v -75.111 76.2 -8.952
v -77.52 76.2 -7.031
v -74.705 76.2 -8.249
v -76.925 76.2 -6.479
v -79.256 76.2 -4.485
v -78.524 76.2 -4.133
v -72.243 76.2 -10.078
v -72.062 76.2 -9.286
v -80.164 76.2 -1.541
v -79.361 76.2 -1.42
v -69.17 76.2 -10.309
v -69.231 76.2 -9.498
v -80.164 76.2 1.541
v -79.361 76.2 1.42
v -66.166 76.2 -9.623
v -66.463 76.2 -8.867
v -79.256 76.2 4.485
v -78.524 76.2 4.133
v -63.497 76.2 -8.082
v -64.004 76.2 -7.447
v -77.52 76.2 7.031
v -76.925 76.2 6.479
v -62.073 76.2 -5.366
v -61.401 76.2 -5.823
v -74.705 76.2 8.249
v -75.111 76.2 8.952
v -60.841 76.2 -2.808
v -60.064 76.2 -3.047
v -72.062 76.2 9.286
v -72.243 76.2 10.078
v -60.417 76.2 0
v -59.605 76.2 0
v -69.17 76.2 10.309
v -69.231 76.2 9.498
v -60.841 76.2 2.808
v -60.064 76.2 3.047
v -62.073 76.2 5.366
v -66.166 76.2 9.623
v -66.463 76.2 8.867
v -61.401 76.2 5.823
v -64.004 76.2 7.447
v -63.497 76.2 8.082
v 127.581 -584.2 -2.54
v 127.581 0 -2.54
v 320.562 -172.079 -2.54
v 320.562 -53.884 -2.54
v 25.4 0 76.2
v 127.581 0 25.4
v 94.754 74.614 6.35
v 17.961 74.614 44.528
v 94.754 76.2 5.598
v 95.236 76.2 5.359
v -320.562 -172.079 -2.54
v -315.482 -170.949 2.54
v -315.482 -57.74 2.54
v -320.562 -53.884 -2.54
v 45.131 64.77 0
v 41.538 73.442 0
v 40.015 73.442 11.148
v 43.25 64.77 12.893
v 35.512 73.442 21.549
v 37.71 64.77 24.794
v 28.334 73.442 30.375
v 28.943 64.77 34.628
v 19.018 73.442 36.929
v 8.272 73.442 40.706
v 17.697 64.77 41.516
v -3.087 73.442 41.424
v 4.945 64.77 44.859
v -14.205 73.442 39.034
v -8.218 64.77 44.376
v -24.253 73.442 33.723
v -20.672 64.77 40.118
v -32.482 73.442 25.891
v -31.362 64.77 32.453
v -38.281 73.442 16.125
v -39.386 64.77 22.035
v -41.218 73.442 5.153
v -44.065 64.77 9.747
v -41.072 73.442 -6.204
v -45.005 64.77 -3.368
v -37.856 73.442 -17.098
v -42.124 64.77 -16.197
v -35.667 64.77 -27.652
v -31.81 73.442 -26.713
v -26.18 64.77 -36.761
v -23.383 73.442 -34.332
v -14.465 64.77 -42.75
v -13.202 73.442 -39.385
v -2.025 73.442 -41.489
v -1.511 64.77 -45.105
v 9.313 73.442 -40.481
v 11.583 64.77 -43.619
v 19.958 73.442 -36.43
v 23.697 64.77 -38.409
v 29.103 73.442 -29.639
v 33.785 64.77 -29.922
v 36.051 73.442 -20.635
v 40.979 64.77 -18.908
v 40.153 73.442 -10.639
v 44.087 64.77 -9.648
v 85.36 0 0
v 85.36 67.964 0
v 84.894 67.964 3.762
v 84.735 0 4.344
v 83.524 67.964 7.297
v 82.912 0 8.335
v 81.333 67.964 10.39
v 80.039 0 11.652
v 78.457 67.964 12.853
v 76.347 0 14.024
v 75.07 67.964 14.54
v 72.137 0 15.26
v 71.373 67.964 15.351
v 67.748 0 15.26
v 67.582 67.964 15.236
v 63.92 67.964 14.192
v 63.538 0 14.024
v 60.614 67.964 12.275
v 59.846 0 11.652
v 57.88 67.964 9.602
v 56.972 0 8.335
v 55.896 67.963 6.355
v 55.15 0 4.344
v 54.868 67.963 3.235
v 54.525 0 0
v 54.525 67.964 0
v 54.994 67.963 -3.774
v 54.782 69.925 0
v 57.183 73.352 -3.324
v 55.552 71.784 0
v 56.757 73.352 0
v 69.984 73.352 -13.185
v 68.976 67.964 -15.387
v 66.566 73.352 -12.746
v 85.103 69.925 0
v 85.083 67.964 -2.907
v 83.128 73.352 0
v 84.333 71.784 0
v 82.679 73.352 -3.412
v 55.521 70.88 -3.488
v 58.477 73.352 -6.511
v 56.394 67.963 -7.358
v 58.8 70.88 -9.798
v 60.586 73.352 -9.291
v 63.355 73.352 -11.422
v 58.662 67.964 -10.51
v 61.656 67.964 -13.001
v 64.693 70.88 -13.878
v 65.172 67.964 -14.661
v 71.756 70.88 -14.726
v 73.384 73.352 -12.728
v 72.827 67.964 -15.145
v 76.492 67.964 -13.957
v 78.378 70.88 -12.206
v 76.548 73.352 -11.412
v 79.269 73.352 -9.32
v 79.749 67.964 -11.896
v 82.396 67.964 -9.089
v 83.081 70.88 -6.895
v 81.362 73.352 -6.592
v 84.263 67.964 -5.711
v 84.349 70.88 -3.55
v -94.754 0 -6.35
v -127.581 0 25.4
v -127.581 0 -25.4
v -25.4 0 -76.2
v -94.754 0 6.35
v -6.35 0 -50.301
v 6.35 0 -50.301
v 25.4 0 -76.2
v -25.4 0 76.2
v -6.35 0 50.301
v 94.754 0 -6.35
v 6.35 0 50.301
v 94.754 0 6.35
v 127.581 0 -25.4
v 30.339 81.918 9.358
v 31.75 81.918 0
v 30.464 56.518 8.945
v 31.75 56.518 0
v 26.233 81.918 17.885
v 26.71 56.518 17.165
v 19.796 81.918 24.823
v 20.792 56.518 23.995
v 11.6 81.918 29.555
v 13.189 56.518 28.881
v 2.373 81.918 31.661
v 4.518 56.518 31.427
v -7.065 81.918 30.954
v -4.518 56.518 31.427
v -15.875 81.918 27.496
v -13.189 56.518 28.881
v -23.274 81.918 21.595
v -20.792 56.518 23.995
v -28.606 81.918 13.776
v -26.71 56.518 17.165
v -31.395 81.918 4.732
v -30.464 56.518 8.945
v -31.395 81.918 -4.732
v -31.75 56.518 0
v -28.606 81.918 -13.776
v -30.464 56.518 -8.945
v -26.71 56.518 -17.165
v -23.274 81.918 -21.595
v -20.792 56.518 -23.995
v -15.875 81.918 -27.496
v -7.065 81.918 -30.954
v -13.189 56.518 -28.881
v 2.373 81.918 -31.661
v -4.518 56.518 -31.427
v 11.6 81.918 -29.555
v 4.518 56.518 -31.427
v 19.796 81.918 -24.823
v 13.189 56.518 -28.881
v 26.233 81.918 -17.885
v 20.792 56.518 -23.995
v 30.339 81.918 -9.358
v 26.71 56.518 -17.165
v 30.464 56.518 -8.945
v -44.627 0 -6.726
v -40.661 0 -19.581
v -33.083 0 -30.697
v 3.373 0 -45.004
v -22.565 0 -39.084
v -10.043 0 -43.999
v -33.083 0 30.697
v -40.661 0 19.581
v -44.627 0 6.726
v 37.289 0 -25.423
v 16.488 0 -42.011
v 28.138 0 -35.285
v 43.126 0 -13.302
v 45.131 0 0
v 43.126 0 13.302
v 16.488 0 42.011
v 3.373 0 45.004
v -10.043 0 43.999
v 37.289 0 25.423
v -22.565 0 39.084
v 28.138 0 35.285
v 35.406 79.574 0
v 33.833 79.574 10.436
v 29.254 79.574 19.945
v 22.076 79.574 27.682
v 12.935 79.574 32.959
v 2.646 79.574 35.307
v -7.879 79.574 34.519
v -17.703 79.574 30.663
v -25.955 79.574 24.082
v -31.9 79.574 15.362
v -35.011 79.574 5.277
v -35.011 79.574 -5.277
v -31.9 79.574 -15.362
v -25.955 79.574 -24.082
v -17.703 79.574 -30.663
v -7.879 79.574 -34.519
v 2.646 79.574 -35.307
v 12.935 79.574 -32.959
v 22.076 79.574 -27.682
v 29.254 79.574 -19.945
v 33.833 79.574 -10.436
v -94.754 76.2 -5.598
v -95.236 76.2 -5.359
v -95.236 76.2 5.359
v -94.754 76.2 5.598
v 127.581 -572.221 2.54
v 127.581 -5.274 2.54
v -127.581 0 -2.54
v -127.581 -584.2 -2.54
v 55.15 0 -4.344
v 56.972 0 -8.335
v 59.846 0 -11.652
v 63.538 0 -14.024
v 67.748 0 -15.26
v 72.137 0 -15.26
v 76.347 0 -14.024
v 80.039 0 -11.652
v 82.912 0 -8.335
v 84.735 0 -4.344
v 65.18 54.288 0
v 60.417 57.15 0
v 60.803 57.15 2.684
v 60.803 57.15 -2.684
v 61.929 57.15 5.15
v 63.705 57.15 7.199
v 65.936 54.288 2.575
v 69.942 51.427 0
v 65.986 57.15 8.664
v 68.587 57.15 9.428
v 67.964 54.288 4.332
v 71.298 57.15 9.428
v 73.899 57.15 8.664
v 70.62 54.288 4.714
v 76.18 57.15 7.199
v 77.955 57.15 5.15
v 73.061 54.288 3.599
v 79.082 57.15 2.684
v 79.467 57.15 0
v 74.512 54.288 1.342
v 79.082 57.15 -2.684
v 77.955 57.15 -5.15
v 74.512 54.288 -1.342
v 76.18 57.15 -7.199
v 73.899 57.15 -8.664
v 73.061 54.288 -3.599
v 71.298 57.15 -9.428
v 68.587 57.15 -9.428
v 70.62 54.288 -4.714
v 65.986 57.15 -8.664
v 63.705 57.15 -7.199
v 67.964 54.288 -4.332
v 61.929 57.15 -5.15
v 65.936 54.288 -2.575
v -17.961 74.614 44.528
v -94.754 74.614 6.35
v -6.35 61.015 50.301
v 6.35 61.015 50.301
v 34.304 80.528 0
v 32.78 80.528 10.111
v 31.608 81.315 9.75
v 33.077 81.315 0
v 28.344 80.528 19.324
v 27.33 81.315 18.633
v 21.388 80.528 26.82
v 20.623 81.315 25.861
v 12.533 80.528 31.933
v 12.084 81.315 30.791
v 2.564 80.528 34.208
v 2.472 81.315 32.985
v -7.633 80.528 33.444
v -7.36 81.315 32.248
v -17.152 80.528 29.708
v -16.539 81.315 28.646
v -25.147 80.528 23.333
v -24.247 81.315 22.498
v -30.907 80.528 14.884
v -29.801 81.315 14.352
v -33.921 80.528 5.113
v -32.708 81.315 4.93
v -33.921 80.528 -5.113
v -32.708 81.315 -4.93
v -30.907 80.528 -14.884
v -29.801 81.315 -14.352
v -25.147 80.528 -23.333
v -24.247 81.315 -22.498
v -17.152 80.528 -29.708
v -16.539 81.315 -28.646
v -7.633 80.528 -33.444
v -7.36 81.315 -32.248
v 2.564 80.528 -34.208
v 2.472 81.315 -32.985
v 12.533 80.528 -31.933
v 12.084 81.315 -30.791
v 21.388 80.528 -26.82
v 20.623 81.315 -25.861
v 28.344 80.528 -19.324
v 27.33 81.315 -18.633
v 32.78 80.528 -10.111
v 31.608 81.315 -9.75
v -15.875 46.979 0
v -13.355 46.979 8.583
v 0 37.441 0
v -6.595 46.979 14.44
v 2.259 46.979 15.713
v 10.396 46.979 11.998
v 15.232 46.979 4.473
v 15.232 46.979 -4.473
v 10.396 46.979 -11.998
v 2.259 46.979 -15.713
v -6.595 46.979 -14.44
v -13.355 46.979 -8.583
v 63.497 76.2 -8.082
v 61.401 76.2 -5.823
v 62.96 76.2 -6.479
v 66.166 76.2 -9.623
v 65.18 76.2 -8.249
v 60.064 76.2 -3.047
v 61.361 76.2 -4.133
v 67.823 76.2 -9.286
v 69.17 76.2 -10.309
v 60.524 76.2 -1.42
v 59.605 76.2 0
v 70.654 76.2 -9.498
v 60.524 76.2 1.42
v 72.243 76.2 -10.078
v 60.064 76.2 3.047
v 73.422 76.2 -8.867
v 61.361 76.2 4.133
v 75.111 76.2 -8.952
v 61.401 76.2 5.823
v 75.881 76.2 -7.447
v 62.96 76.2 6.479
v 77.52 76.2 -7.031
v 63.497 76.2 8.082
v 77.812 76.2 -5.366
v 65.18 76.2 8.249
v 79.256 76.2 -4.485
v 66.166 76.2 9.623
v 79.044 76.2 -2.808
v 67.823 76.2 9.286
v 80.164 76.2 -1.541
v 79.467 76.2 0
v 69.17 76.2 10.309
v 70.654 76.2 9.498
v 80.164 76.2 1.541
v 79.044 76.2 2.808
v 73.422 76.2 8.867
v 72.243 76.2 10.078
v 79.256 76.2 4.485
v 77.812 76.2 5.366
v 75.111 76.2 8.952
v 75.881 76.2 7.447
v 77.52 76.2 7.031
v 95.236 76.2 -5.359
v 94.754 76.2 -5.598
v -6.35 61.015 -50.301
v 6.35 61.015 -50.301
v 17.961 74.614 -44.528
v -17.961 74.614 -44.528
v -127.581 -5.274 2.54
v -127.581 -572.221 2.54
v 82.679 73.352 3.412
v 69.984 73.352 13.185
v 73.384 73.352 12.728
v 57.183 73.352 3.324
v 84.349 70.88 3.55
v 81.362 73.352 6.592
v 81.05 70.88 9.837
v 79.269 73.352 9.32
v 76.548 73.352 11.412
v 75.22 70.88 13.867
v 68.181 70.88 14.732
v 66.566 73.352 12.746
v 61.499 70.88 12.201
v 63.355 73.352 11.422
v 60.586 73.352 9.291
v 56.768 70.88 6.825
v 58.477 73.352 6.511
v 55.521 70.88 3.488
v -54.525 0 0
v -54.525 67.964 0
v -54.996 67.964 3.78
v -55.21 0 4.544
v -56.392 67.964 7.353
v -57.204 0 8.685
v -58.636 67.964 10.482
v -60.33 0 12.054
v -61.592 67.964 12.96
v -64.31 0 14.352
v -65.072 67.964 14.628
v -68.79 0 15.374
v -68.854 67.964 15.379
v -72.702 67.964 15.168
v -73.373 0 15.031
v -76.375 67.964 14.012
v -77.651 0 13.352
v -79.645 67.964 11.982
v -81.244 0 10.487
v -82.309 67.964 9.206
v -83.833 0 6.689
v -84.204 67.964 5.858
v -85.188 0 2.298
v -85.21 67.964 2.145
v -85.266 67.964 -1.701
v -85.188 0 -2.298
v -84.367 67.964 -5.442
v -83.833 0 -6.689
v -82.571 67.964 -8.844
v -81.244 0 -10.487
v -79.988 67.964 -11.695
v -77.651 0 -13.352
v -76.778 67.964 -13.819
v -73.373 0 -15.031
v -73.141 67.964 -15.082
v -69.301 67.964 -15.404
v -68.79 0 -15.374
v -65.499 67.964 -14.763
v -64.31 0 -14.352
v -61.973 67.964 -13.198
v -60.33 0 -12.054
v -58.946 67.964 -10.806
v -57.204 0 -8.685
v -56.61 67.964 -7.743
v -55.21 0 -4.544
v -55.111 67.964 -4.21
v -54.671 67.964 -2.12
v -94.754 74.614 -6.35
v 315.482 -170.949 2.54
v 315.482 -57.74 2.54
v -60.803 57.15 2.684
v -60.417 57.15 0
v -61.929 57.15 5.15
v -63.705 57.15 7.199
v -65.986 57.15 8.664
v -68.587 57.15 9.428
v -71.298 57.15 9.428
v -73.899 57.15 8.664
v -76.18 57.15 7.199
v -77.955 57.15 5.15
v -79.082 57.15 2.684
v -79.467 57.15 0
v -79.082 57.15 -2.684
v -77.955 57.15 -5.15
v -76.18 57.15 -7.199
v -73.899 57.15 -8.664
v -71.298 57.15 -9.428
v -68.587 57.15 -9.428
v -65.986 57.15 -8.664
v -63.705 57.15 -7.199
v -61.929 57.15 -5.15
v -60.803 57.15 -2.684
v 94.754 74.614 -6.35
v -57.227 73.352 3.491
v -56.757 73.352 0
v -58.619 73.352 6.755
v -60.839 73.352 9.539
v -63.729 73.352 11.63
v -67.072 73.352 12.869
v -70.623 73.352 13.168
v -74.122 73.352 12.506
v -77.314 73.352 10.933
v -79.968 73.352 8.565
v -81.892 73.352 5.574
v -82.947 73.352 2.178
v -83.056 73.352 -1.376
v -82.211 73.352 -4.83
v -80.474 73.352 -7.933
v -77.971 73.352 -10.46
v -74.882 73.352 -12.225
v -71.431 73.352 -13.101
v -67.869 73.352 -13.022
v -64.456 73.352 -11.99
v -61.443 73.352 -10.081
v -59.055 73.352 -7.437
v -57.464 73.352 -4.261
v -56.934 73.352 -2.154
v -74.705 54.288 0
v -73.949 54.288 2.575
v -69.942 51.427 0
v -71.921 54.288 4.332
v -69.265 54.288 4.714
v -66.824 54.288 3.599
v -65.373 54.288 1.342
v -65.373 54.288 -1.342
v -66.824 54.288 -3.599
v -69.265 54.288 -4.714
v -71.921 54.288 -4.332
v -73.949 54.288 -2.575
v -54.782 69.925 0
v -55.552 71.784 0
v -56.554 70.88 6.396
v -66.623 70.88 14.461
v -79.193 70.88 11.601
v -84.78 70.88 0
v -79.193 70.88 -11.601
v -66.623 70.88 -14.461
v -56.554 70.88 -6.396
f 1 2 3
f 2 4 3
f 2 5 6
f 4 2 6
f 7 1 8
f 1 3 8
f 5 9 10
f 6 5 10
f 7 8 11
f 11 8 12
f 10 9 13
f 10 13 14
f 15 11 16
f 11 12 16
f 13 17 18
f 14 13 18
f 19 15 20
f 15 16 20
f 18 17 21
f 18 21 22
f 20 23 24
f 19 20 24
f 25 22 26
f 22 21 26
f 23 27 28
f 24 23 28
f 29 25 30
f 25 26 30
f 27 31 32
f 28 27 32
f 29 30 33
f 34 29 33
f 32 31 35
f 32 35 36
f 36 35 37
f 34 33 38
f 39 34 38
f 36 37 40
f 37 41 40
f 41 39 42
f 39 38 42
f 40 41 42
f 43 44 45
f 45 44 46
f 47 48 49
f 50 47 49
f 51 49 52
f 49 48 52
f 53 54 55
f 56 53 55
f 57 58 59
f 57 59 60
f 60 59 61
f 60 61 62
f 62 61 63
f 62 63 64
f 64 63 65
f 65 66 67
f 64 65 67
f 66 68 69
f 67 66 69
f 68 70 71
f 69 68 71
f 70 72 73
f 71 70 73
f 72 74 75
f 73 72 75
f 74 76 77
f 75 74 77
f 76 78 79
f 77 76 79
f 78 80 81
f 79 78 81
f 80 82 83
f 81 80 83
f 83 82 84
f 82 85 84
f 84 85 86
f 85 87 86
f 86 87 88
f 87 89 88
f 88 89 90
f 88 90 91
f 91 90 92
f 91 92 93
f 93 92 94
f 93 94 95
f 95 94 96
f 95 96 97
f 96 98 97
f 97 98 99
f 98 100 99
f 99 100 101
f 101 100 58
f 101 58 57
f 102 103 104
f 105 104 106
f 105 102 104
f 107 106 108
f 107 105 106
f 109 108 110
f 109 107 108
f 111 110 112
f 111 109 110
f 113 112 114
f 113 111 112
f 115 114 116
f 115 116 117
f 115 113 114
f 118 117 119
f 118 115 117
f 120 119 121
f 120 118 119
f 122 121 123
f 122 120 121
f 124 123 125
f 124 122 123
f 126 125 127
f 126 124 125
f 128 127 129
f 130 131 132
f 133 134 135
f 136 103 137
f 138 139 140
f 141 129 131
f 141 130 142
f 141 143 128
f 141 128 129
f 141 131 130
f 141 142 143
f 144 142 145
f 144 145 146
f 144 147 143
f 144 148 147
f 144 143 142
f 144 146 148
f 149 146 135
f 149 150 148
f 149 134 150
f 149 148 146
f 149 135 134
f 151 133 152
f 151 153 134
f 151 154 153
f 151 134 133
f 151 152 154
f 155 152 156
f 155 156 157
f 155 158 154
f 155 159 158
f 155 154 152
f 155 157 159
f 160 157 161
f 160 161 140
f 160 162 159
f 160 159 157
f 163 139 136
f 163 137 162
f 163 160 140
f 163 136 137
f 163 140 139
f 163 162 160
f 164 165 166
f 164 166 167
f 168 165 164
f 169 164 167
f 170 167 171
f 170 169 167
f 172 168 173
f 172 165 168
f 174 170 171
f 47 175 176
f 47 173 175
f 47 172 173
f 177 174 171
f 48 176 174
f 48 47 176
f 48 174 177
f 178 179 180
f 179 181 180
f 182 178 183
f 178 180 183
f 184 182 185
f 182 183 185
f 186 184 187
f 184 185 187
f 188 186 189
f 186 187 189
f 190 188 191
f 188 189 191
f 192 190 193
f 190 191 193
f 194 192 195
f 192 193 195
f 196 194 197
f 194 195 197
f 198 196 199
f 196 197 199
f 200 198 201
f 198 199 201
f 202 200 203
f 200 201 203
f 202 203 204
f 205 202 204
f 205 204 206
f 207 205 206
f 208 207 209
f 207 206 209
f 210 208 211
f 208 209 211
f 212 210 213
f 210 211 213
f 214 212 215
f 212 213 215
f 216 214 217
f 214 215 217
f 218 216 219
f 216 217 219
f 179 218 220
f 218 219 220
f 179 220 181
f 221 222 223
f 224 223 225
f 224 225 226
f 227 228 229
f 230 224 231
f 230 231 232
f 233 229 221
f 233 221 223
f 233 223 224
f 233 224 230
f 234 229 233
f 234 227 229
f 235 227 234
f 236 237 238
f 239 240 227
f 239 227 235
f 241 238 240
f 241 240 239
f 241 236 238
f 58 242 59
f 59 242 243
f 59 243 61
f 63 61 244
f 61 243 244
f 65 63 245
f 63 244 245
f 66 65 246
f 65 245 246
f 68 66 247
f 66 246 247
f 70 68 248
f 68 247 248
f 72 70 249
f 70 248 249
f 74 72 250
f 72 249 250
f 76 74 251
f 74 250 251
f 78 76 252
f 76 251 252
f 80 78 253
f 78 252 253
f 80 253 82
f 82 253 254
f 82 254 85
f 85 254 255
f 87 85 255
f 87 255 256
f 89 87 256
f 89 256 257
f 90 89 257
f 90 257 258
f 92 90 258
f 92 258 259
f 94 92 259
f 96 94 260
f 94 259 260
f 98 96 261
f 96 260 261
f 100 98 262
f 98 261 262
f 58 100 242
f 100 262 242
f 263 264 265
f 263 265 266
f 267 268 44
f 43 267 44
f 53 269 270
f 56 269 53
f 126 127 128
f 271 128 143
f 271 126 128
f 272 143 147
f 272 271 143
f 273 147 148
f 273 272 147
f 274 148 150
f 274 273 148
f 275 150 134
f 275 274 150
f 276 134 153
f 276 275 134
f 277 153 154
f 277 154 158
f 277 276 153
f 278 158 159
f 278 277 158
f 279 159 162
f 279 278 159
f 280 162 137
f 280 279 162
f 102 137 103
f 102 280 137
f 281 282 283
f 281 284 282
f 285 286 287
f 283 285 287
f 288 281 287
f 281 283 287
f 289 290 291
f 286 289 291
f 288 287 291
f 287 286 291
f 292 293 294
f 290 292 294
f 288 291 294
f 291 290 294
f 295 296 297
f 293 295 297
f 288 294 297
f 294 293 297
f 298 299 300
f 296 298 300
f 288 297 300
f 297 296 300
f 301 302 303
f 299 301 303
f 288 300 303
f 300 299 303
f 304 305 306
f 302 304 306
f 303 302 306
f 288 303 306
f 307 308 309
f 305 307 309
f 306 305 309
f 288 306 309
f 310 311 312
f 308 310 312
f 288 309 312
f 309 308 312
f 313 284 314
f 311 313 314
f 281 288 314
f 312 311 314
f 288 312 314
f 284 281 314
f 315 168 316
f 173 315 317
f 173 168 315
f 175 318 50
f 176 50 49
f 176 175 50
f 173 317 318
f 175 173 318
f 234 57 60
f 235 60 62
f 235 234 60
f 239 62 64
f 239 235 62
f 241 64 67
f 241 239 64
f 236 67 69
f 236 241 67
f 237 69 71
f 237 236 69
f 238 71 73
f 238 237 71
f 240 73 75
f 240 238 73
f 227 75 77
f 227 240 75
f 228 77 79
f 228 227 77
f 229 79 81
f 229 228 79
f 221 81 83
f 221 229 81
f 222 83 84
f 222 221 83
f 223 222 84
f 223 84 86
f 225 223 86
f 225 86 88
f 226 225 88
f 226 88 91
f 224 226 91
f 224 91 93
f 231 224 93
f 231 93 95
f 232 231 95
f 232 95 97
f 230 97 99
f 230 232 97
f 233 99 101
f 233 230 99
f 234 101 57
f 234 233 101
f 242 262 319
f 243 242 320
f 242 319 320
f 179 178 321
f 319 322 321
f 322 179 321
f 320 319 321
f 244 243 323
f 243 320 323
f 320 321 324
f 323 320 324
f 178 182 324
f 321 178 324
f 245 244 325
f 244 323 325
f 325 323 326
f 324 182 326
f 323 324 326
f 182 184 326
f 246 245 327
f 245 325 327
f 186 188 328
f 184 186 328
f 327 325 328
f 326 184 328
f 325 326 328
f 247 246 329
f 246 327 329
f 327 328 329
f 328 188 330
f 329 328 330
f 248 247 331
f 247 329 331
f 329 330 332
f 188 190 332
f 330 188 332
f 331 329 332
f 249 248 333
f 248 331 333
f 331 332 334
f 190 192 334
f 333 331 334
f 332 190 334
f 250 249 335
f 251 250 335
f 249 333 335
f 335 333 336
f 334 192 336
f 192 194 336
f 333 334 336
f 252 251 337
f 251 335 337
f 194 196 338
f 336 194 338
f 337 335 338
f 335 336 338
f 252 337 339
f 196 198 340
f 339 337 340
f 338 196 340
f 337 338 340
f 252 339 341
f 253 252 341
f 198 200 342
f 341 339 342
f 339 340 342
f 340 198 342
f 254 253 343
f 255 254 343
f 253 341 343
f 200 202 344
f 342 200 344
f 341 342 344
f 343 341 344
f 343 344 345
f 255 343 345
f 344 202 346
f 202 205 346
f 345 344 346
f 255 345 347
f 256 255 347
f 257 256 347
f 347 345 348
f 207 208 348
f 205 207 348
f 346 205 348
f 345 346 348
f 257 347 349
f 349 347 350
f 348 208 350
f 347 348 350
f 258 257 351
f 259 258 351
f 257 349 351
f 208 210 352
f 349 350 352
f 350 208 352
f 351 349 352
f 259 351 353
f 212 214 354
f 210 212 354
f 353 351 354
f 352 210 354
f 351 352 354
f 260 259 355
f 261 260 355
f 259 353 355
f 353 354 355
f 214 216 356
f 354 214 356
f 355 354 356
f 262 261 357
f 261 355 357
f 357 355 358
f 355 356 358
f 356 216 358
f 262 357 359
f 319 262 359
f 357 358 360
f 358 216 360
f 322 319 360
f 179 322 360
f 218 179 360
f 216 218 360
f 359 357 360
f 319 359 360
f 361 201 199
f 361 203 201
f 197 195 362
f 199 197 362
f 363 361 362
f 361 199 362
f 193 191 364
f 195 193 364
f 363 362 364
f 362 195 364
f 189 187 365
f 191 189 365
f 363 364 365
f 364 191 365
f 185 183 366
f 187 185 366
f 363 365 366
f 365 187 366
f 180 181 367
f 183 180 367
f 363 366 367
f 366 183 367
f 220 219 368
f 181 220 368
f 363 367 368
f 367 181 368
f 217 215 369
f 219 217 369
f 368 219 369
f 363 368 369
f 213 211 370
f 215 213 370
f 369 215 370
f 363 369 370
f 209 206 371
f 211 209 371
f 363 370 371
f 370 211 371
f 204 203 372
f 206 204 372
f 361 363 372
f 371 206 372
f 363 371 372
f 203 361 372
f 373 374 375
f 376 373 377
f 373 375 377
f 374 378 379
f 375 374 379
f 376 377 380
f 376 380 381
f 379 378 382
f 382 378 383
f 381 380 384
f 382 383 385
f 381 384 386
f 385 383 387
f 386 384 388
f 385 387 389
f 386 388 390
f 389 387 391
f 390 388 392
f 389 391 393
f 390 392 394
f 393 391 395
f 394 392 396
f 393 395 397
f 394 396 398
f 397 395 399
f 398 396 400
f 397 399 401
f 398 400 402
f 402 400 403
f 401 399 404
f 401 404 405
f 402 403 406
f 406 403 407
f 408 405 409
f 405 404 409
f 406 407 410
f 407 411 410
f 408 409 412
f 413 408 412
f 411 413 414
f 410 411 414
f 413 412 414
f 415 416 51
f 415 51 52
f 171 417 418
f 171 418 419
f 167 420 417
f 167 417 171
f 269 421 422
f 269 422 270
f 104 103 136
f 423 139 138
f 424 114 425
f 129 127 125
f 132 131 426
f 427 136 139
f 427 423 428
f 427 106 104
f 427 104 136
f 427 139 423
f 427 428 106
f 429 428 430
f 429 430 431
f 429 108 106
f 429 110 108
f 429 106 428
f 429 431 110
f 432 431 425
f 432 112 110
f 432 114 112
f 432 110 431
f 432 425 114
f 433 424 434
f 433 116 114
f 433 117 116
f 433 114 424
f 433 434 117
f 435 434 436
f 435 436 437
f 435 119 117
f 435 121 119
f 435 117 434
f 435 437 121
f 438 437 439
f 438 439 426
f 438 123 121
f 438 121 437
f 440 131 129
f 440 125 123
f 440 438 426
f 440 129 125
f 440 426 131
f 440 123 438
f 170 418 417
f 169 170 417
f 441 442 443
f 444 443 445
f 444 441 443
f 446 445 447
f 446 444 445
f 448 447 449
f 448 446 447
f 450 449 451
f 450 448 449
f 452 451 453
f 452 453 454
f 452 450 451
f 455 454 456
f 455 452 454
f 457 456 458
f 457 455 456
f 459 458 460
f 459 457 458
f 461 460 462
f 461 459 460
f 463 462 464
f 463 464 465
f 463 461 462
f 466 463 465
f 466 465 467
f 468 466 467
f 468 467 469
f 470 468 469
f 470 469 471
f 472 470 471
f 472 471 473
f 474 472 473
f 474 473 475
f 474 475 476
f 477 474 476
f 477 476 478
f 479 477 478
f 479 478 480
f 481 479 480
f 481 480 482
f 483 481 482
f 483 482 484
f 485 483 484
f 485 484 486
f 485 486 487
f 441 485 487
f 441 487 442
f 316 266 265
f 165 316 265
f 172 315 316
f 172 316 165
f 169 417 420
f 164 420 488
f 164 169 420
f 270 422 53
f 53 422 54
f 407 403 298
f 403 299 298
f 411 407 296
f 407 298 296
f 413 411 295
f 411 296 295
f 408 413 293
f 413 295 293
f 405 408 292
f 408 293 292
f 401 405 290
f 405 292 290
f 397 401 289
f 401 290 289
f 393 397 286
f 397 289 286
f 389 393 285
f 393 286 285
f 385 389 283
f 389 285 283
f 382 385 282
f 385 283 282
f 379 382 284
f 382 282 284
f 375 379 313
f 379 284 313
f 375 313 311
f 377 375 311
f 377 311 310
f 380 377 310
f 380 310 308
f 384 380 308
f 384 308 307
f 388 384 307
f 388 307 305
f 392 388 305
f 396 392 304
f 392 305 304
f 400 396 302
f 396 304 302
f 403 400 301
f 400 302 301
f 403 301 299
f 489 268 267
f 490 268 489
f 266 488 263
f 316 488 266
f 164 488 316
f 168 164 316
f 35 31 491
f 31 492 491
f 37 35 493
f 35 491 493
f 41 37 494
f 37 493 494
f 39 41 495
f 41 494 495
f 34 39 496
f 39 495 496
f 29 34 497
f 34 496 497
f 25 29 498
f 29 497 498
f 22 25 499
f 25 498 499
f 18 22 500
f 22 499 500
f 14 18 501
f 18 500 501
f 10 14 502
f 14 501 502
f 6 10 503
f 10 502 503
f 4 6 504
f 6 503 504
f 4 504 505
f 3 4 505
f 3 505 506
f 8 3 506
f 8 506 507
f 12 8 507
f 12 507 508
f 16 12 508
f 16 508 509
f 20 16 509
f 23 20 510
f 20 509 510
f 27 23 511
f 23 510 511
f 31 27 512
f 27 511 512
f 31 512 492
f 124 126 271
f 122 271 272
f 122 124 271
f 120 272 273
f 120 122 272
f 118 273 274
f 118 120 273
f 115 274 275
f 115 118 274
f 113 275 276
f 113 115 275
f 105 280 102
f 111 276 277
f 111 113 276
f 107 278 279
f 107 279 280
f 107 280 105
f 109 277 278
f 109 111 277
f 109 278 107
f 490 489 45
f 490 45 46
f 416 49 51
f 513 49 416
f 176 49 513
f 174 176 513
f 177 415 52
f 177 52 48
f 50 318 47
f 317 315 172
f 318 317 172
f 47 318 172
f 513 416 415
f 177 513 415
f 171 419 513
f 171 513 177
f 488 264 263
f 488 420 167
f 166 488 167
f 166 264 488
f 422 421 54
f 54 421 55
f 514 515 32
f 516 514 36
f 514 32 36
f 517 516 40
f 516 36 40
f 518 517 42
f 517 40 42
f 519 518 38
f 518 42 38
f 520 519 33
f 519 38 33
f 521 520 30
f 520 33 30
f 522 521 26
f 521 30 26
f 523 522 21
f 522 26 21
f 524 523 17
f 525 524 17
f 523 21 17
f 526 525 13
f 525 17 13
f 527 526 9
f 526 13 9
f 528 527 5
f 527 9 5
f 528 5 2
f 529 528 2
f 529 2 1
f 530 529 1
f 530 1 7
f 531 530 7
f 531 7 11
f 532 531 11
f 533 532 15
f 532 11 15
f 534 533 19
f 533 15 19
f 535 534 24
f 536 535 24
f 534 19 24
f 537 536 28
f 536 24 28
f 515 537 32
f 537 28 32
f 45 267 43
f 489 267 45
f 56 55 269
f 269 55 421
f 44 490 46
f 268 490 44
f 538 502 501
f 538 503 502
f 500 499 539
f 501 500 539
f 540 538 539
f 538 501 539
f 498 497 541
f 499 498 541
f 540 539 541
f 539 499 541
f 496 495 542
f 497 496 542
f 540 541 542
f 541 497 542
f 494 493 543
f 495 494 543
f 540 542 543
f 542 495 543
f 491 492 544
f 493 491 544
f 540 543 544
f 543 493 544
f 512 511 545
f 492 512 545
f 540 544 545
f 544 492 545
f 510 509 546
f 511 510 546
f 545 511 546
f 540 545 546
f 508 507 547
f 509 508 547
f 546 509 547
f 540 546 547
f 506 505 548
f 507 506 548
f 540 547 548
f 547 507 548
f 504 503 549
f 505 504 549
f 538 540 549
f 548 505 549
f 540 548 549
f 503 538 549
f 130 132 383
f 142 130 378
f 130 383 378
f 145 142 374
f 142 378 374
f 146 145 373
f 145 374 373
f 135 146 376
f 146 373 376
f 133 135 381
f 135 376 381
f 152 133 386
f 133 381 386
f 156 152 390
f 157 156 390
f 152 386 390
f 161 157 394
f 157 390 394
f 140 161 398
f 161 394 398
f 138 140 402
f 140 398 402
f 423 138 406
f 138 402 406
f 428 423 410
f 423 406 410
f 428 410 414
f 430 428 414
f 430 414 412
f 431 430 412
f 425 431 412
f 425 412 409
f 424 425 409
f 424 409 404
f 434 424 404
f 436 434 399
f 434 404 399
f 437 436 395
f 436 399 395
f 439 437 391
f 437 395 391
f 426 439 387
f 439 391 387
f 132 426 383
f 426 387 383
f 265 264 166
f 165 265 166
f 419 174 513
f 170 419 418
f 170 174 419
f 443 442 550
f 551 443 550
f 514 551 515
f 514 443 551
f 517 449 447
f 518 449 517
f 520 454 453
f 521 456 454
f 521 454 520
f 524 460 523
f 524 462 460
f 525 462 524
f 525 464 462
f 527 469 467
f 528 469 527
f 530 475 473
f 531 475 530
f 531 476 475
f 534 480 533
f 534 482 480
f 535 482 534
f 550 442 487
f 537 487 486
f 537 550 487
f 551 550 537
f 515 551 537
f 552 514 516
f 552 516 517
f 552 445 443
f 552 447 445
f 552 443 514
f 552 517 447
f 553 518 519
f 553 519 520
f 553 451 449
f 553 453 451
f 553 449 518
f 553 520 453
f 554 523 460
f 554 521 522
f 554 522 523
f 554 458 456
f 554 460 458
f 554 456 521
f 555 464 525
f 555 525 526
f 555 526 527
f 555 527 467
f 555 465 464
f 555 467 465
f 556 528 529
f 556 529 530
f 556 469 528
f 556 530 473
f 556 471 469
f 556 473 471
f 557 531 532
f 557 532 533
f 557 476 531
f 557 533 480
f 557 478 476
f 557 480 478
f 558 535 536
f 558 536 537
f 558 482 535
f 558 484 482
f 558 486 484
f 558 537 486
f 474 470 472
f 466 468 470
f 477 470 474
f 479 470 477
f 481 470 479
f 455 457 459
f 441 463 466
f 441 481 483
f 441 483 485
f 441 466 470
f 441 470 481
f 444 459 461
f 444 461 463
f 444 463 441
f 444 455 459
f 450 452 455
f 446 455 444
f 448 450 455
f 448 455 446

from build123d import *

# Parameters (mm, degrees)
F1_DEPTH         = 2.54
F1_DEPTH_BACK    = 2.54
F2_SIZE          = 5.07999
F5_DEPTH         = 76.2
F6_T1_DEPTH      = 509.1856975688
F6_T3_DEPTH      = 445.8733729354
F6_T5_DEPTH      = 509.1856975688
F6_T7_DEPTH      = 445.8733729354
F6_T9_DEPTH      = 509.1856975688
F6_T11_DEPTH     = 509.1856975688
F4_R             = 45.1305930008
F7_DEPTH         = 82.55
F8_DEPTH         = 76.2
F4_R_2           = 15.4174158708
F9_SIZE          = 12.7
F10_R            = 10.16
F12_D            = 63.5
F12_DEPTH        = 25.4
F12_START        = 0.6321404
F12_TIP          = 19.0773246541
F13_SIZE         = 5.08
F15_R            = 7.62
F15_2_R          = 7.62
F18_D            = 19.05
F18_DEPTH        = 19.05
F18_TIP          = 5.7231973962
F18_ON_F17_D     = 19.05
F18_ON_F17_DEPTH = 19.05
F18_ON_F17_TIP   = 5.7231973962


# Not quite as in the source:
# - a fillet or chamfer that OpenCascade refuses, or shapes differently, is made with other operations: its cross-section is extruded or revolved along the edge and cut away or added
# - a fillet or chamfer is up to 0.001 mm smaller than in the source, because OpenCascade refuses the exact size


with BuildPart() as f1:
    # F0 (on Top) → F1 (new body, two sides)
    with BuildSketch(Plane.XY) as f1_sk:
        Polygon((320.5616772175, -53.8842752576), (127.5811266, 0), (127.5811266, -584.2), (320.5616772175, -172.0790863037), align=None)
    extrude(amount=F1_DEPTH)
    extrude(f1_sk.sketch, amount=-F1_DEPTH_BACK)

    # F2 (size 5.08 in the source; OpenCascade refuses exactly that, so slightly less here)
    f2_edges = [f1.edges().sort_by_distance(p)[0] for p in [
        (224.071402, -378.139543, 2.54),
        (320.561677, -112.981681, 2.54),
        (224.071402, -26.942138, 2.54),
    ]]
    chamfer(f2_edges, length=F2_SIZE)


with BuildPart() as f3_1:
    # F3: instance of F1
    add(f1.part.mirror(Plane.YZ))


with BuildPart() as f5:
    # F4 (on Front) → F5 (new body)
    with BuildSketch(Plane.XZ):
        Polygon((-127.5811266, 25.4), (-127.5811266, 0), (-127.5811266, -25.4), (-25.4, -76.2), (0, -76.2), (25.4, -76.2), (127.5811266, -25.4), (127.5811266, 0), (127.5811266, 25.4), (25.4, 76.2), (0, 76.2), (-25.4, 76.2), align=None)
        Polygon((94.7542563081, 6.35), (94.7542563081, 0), (94.7542563081, -6.35), (6.35, -50.3007409038), (-6.35, -50.3007409038), (-94.7542563081, -6.35), (-94.7542563081, 6.35), (-6.35, 50.3007409038), (6.35, 50.3007409038), align=None, mode=Mode.SUBTRACT)
    extrude(amount=-F5_DEPTH)

    # F6: chamfer of 76.2 x 32.3449809952 on 8 edges, made by hand

    # F6_s2 → F6_t1 (cut)
    with BuildSketch(Plane(origin=(269.0546874739, 0, -133.7622570671), x_dir=(0, 1, 0), z_dir=(-0.8954433882, 0, 0.4451754021))):
        Polygon((0, -79.54024139), (76.2, -47.1952603949), (76.2, -79.54024139), align=None)
    extrude(amount=F6_T1_DEPTH, mode=Mode.SUBTRACT)

    # F6_s4 → F6_t3 (cut)
    with BuildSketch(Plane.YZ.offset(-222.9366864677)):
        Polygon((76.2, 43.8550190048), (0, 76.2), (76.2, 76.2), align=None)
        Polygon((76.2, -43.8550190048), (0, -76.2), (76.2, -76.2), align=None)
    extrude(amount=F6_T3_DEPTH, mode=Mode.SUBTRACT)

    # F6_s6 → F6_t5 (cut)
    with BuildSketch(Plane(origin=(186.8922787572, 0, 92.9146905772), x_dir=(0, 1, 0), z_dir=(-0.8954433882, 0, -0.4451754021))):
        Polygon((76.2, -47.1952603949), (0, -79.54024139), (76.2, -79.54024139), align=None)
    extrude(amount=F6_T5_DEPTH, mode=Mode.SUBTRACT)

    # F6_s8 → F6_t7 (cut)
    with BuildSketch(Plane.XY.offset(-222.9366864677)):
        Polygon((-95.2361456048, 76.2), (-127.5811266, 0), (-127.5811266, 76.2), align=None)
        Polygon((95.2361456048, 76.2), (127.5811266, 0), (127.5811266, 76.2), align=None)
    extrude(amount=F6_T7_DEPTH, mode=Mode.SUBTRACT)

    # F6_s10 → F6_t9 (cut)
    with BuildSketch(Plane(origin=(-269.0546874739, 0, 133.7622570671), x_dir=(0, 1, 0), z_dir=(0.8954433882, 0, -0.4451754021))):
        Polygon((76.2, -47.1952603949), (0, -79.54024139), (76.2, -79.54024139), align=None)
    extrude(amount=F6_T9_DEPTH, mode=Mode.SUBTRACT)

    # F6_s12 → F6_t11 (cut)
    with BuildSketch(Plane(origin=(-186.8922787572, 0, -92.9146905772), x_dir=(0, 1, 0), z_dir=(0.8954433882, 0, 0.4451754021))):
        Polygon((76.2, -47.1952603949), (0, -79.54024139), (76.2, -79.54024139), align=None)
    extrude(amount=F6_T11_DEPTH, mode=Mode.SUBTRACT)


with BuildPart() as f7:
    # F4 (on Front) → F7 (new body)
    with BuildSketch(Plane.XZ):
        Circle(F4_R)
    extrude(amount=-F7_DEPTH)

    # F9
    f9_edges = [f7.edges().sort_by_distance(p)[0] for p in [
        (-45.130593, 82.55, 0),
    ]]
    chamfer(f9_edges, length=F9_SIZE)

    # F10
    f10_edges = [f7.edges().sort_by_distance(p)[0] for p in [
        (-32.430593, 82.55, 0),
    ]]
    fillet(f10_edges, radius=F10_R)

    # F12
    # its depths count from where the whole tool has entered the part; down to there all is cleared
    with Locations(Plane(origin=(0, 82.55, 0), x_dir=(-1, 0, 0), z_dir=(0, 1, 0)).offset(-F12_START)):
        with Locations((0, 0)):
            Hole(F12_D / 2, depth=F12_DEPTH)
            with Locations((0, 0, -(F12_DEPTH + F12_TIP / 2))):  # 118° drill point
                Cone(0, F12_D / 2, F12_TIP, mode=Mode.SUBTRACT)

    # F13
    f13_edges = [f7.edges().sort_by_distance(p)[0] for p in [
        (-45.130593, 69.85, 0),
    ]]
    chamfer(f13_edges, length=F13_SIZE)


with BuildPart() as f8:
    # F4 (on Front) → F8 (new body)
    with BuildSketch(Plane.XZ):
        with BuildLine():
            Line((54.5250087836, 0), (85.3598405253, 0))
            ThreePointArc((85.3598405253, 0), (69.9424246545, 15.4174158708), (54.5250087836, 0))
        make_face()
        with BuildLine():
            ThreePointArc((54.5250087836, 0), (69.9424246545, -15.4174158708), (85.3598405253, 0))
            Line((85.3598405253, 0), (54.5250087836, 0))
        make_face()
    extrude(amount=-F8_DEPTH)

    # F14: chamfer of 5.08 on 1 edges, made by hand

    # F14_s1 → F14_t2 (revolve, cut)
    with BuildSketch(Plane.XY):
        Polygon((54.5250087836, 71.12), (59.6050087836, 76.2), (54.5250087836, 76.2), align=None)
    revolve(axis=Axis((69.9424246545, 76.2, 0), (0, -1, 0)), mode=Mode.SUBTRACT)

    # F15
    f15_edges = [f8.edges().sort_by_distance(p)[0] for p in [
        (85.359841, 71.12, 0),
    ]]
    fillet(f15_edges, radius=F15_R)

    # F18
    with Locations(Plane(origin=(0, 76.2, 0), x_dir=(-1, 0, 0), z_dir=(0, 1, 0))):
        with Locations((-69.9424246545, 0)):
            Hole(F18_D / 2, depth=F18_DEPTH)
            with Locations((0, 0, -(F18_DEPTH + F18_TIP / 2))):  # 118° drill point
                Cone(0, F18_D / 2, F18_TIP, mode=Mode.SUBTRACT)


with BuildPart() as f8b:
    # F4 (on Front) → F8, piece 2 (new body)
    with BuildSketch(Plane.XZ):
        with Locations((-69.9424246545, 0)):
            Circle(F4_R_2)
    extrude(amount=-F8_DEPTH)

    # F14#2: chamfer of 5.08 on 1 edges, made by hand

    # F14_2_s1 → F14_2_t2 (revolve, cut)
    with BuildSketch(Plane.XY):
        Polygon((-54.5250087836, 71.12), (-59.6050087836, 76.2), (-54.5250087836, 76.2), align=None)
    revolve(axis=Axis((-69.9424246545, 76.2, 0), (0, -1, 0)), mode=Mode.SUBTRACT)

    # F15#2
    f15_2_edges = [f8b.edges().sort_by_distance(p)[0] for p in [
        (-85.359841, 71.12, 0),
    ]]
    fillet(f15_2_edges, radius=F15_2_R)

    # F18 on F17
    with Locations(Plane(origin=(0, 76.2, 0), x_dir=(-1, 0, 0), z_dir=(0, 1, 0))):
        with Locations((69.9424246545, 0)):
            Hole(F18_ON_F17_D / 2, depth=F18_ON_F17_DEPTH)
            with Locations((0, 0, -(F18_ON_F17_DEPTH + F18_ON_F17_TIP / 2))):  # 118° drill point
                Cone(0, F18_ON_F17_D / 2, F18_ON_F17_TIP, mode=Mode.SUBTRACT)


solid = Compound([f1.part, f3_1.part, f5.part, f7.part, f8.part, f8b.part])
